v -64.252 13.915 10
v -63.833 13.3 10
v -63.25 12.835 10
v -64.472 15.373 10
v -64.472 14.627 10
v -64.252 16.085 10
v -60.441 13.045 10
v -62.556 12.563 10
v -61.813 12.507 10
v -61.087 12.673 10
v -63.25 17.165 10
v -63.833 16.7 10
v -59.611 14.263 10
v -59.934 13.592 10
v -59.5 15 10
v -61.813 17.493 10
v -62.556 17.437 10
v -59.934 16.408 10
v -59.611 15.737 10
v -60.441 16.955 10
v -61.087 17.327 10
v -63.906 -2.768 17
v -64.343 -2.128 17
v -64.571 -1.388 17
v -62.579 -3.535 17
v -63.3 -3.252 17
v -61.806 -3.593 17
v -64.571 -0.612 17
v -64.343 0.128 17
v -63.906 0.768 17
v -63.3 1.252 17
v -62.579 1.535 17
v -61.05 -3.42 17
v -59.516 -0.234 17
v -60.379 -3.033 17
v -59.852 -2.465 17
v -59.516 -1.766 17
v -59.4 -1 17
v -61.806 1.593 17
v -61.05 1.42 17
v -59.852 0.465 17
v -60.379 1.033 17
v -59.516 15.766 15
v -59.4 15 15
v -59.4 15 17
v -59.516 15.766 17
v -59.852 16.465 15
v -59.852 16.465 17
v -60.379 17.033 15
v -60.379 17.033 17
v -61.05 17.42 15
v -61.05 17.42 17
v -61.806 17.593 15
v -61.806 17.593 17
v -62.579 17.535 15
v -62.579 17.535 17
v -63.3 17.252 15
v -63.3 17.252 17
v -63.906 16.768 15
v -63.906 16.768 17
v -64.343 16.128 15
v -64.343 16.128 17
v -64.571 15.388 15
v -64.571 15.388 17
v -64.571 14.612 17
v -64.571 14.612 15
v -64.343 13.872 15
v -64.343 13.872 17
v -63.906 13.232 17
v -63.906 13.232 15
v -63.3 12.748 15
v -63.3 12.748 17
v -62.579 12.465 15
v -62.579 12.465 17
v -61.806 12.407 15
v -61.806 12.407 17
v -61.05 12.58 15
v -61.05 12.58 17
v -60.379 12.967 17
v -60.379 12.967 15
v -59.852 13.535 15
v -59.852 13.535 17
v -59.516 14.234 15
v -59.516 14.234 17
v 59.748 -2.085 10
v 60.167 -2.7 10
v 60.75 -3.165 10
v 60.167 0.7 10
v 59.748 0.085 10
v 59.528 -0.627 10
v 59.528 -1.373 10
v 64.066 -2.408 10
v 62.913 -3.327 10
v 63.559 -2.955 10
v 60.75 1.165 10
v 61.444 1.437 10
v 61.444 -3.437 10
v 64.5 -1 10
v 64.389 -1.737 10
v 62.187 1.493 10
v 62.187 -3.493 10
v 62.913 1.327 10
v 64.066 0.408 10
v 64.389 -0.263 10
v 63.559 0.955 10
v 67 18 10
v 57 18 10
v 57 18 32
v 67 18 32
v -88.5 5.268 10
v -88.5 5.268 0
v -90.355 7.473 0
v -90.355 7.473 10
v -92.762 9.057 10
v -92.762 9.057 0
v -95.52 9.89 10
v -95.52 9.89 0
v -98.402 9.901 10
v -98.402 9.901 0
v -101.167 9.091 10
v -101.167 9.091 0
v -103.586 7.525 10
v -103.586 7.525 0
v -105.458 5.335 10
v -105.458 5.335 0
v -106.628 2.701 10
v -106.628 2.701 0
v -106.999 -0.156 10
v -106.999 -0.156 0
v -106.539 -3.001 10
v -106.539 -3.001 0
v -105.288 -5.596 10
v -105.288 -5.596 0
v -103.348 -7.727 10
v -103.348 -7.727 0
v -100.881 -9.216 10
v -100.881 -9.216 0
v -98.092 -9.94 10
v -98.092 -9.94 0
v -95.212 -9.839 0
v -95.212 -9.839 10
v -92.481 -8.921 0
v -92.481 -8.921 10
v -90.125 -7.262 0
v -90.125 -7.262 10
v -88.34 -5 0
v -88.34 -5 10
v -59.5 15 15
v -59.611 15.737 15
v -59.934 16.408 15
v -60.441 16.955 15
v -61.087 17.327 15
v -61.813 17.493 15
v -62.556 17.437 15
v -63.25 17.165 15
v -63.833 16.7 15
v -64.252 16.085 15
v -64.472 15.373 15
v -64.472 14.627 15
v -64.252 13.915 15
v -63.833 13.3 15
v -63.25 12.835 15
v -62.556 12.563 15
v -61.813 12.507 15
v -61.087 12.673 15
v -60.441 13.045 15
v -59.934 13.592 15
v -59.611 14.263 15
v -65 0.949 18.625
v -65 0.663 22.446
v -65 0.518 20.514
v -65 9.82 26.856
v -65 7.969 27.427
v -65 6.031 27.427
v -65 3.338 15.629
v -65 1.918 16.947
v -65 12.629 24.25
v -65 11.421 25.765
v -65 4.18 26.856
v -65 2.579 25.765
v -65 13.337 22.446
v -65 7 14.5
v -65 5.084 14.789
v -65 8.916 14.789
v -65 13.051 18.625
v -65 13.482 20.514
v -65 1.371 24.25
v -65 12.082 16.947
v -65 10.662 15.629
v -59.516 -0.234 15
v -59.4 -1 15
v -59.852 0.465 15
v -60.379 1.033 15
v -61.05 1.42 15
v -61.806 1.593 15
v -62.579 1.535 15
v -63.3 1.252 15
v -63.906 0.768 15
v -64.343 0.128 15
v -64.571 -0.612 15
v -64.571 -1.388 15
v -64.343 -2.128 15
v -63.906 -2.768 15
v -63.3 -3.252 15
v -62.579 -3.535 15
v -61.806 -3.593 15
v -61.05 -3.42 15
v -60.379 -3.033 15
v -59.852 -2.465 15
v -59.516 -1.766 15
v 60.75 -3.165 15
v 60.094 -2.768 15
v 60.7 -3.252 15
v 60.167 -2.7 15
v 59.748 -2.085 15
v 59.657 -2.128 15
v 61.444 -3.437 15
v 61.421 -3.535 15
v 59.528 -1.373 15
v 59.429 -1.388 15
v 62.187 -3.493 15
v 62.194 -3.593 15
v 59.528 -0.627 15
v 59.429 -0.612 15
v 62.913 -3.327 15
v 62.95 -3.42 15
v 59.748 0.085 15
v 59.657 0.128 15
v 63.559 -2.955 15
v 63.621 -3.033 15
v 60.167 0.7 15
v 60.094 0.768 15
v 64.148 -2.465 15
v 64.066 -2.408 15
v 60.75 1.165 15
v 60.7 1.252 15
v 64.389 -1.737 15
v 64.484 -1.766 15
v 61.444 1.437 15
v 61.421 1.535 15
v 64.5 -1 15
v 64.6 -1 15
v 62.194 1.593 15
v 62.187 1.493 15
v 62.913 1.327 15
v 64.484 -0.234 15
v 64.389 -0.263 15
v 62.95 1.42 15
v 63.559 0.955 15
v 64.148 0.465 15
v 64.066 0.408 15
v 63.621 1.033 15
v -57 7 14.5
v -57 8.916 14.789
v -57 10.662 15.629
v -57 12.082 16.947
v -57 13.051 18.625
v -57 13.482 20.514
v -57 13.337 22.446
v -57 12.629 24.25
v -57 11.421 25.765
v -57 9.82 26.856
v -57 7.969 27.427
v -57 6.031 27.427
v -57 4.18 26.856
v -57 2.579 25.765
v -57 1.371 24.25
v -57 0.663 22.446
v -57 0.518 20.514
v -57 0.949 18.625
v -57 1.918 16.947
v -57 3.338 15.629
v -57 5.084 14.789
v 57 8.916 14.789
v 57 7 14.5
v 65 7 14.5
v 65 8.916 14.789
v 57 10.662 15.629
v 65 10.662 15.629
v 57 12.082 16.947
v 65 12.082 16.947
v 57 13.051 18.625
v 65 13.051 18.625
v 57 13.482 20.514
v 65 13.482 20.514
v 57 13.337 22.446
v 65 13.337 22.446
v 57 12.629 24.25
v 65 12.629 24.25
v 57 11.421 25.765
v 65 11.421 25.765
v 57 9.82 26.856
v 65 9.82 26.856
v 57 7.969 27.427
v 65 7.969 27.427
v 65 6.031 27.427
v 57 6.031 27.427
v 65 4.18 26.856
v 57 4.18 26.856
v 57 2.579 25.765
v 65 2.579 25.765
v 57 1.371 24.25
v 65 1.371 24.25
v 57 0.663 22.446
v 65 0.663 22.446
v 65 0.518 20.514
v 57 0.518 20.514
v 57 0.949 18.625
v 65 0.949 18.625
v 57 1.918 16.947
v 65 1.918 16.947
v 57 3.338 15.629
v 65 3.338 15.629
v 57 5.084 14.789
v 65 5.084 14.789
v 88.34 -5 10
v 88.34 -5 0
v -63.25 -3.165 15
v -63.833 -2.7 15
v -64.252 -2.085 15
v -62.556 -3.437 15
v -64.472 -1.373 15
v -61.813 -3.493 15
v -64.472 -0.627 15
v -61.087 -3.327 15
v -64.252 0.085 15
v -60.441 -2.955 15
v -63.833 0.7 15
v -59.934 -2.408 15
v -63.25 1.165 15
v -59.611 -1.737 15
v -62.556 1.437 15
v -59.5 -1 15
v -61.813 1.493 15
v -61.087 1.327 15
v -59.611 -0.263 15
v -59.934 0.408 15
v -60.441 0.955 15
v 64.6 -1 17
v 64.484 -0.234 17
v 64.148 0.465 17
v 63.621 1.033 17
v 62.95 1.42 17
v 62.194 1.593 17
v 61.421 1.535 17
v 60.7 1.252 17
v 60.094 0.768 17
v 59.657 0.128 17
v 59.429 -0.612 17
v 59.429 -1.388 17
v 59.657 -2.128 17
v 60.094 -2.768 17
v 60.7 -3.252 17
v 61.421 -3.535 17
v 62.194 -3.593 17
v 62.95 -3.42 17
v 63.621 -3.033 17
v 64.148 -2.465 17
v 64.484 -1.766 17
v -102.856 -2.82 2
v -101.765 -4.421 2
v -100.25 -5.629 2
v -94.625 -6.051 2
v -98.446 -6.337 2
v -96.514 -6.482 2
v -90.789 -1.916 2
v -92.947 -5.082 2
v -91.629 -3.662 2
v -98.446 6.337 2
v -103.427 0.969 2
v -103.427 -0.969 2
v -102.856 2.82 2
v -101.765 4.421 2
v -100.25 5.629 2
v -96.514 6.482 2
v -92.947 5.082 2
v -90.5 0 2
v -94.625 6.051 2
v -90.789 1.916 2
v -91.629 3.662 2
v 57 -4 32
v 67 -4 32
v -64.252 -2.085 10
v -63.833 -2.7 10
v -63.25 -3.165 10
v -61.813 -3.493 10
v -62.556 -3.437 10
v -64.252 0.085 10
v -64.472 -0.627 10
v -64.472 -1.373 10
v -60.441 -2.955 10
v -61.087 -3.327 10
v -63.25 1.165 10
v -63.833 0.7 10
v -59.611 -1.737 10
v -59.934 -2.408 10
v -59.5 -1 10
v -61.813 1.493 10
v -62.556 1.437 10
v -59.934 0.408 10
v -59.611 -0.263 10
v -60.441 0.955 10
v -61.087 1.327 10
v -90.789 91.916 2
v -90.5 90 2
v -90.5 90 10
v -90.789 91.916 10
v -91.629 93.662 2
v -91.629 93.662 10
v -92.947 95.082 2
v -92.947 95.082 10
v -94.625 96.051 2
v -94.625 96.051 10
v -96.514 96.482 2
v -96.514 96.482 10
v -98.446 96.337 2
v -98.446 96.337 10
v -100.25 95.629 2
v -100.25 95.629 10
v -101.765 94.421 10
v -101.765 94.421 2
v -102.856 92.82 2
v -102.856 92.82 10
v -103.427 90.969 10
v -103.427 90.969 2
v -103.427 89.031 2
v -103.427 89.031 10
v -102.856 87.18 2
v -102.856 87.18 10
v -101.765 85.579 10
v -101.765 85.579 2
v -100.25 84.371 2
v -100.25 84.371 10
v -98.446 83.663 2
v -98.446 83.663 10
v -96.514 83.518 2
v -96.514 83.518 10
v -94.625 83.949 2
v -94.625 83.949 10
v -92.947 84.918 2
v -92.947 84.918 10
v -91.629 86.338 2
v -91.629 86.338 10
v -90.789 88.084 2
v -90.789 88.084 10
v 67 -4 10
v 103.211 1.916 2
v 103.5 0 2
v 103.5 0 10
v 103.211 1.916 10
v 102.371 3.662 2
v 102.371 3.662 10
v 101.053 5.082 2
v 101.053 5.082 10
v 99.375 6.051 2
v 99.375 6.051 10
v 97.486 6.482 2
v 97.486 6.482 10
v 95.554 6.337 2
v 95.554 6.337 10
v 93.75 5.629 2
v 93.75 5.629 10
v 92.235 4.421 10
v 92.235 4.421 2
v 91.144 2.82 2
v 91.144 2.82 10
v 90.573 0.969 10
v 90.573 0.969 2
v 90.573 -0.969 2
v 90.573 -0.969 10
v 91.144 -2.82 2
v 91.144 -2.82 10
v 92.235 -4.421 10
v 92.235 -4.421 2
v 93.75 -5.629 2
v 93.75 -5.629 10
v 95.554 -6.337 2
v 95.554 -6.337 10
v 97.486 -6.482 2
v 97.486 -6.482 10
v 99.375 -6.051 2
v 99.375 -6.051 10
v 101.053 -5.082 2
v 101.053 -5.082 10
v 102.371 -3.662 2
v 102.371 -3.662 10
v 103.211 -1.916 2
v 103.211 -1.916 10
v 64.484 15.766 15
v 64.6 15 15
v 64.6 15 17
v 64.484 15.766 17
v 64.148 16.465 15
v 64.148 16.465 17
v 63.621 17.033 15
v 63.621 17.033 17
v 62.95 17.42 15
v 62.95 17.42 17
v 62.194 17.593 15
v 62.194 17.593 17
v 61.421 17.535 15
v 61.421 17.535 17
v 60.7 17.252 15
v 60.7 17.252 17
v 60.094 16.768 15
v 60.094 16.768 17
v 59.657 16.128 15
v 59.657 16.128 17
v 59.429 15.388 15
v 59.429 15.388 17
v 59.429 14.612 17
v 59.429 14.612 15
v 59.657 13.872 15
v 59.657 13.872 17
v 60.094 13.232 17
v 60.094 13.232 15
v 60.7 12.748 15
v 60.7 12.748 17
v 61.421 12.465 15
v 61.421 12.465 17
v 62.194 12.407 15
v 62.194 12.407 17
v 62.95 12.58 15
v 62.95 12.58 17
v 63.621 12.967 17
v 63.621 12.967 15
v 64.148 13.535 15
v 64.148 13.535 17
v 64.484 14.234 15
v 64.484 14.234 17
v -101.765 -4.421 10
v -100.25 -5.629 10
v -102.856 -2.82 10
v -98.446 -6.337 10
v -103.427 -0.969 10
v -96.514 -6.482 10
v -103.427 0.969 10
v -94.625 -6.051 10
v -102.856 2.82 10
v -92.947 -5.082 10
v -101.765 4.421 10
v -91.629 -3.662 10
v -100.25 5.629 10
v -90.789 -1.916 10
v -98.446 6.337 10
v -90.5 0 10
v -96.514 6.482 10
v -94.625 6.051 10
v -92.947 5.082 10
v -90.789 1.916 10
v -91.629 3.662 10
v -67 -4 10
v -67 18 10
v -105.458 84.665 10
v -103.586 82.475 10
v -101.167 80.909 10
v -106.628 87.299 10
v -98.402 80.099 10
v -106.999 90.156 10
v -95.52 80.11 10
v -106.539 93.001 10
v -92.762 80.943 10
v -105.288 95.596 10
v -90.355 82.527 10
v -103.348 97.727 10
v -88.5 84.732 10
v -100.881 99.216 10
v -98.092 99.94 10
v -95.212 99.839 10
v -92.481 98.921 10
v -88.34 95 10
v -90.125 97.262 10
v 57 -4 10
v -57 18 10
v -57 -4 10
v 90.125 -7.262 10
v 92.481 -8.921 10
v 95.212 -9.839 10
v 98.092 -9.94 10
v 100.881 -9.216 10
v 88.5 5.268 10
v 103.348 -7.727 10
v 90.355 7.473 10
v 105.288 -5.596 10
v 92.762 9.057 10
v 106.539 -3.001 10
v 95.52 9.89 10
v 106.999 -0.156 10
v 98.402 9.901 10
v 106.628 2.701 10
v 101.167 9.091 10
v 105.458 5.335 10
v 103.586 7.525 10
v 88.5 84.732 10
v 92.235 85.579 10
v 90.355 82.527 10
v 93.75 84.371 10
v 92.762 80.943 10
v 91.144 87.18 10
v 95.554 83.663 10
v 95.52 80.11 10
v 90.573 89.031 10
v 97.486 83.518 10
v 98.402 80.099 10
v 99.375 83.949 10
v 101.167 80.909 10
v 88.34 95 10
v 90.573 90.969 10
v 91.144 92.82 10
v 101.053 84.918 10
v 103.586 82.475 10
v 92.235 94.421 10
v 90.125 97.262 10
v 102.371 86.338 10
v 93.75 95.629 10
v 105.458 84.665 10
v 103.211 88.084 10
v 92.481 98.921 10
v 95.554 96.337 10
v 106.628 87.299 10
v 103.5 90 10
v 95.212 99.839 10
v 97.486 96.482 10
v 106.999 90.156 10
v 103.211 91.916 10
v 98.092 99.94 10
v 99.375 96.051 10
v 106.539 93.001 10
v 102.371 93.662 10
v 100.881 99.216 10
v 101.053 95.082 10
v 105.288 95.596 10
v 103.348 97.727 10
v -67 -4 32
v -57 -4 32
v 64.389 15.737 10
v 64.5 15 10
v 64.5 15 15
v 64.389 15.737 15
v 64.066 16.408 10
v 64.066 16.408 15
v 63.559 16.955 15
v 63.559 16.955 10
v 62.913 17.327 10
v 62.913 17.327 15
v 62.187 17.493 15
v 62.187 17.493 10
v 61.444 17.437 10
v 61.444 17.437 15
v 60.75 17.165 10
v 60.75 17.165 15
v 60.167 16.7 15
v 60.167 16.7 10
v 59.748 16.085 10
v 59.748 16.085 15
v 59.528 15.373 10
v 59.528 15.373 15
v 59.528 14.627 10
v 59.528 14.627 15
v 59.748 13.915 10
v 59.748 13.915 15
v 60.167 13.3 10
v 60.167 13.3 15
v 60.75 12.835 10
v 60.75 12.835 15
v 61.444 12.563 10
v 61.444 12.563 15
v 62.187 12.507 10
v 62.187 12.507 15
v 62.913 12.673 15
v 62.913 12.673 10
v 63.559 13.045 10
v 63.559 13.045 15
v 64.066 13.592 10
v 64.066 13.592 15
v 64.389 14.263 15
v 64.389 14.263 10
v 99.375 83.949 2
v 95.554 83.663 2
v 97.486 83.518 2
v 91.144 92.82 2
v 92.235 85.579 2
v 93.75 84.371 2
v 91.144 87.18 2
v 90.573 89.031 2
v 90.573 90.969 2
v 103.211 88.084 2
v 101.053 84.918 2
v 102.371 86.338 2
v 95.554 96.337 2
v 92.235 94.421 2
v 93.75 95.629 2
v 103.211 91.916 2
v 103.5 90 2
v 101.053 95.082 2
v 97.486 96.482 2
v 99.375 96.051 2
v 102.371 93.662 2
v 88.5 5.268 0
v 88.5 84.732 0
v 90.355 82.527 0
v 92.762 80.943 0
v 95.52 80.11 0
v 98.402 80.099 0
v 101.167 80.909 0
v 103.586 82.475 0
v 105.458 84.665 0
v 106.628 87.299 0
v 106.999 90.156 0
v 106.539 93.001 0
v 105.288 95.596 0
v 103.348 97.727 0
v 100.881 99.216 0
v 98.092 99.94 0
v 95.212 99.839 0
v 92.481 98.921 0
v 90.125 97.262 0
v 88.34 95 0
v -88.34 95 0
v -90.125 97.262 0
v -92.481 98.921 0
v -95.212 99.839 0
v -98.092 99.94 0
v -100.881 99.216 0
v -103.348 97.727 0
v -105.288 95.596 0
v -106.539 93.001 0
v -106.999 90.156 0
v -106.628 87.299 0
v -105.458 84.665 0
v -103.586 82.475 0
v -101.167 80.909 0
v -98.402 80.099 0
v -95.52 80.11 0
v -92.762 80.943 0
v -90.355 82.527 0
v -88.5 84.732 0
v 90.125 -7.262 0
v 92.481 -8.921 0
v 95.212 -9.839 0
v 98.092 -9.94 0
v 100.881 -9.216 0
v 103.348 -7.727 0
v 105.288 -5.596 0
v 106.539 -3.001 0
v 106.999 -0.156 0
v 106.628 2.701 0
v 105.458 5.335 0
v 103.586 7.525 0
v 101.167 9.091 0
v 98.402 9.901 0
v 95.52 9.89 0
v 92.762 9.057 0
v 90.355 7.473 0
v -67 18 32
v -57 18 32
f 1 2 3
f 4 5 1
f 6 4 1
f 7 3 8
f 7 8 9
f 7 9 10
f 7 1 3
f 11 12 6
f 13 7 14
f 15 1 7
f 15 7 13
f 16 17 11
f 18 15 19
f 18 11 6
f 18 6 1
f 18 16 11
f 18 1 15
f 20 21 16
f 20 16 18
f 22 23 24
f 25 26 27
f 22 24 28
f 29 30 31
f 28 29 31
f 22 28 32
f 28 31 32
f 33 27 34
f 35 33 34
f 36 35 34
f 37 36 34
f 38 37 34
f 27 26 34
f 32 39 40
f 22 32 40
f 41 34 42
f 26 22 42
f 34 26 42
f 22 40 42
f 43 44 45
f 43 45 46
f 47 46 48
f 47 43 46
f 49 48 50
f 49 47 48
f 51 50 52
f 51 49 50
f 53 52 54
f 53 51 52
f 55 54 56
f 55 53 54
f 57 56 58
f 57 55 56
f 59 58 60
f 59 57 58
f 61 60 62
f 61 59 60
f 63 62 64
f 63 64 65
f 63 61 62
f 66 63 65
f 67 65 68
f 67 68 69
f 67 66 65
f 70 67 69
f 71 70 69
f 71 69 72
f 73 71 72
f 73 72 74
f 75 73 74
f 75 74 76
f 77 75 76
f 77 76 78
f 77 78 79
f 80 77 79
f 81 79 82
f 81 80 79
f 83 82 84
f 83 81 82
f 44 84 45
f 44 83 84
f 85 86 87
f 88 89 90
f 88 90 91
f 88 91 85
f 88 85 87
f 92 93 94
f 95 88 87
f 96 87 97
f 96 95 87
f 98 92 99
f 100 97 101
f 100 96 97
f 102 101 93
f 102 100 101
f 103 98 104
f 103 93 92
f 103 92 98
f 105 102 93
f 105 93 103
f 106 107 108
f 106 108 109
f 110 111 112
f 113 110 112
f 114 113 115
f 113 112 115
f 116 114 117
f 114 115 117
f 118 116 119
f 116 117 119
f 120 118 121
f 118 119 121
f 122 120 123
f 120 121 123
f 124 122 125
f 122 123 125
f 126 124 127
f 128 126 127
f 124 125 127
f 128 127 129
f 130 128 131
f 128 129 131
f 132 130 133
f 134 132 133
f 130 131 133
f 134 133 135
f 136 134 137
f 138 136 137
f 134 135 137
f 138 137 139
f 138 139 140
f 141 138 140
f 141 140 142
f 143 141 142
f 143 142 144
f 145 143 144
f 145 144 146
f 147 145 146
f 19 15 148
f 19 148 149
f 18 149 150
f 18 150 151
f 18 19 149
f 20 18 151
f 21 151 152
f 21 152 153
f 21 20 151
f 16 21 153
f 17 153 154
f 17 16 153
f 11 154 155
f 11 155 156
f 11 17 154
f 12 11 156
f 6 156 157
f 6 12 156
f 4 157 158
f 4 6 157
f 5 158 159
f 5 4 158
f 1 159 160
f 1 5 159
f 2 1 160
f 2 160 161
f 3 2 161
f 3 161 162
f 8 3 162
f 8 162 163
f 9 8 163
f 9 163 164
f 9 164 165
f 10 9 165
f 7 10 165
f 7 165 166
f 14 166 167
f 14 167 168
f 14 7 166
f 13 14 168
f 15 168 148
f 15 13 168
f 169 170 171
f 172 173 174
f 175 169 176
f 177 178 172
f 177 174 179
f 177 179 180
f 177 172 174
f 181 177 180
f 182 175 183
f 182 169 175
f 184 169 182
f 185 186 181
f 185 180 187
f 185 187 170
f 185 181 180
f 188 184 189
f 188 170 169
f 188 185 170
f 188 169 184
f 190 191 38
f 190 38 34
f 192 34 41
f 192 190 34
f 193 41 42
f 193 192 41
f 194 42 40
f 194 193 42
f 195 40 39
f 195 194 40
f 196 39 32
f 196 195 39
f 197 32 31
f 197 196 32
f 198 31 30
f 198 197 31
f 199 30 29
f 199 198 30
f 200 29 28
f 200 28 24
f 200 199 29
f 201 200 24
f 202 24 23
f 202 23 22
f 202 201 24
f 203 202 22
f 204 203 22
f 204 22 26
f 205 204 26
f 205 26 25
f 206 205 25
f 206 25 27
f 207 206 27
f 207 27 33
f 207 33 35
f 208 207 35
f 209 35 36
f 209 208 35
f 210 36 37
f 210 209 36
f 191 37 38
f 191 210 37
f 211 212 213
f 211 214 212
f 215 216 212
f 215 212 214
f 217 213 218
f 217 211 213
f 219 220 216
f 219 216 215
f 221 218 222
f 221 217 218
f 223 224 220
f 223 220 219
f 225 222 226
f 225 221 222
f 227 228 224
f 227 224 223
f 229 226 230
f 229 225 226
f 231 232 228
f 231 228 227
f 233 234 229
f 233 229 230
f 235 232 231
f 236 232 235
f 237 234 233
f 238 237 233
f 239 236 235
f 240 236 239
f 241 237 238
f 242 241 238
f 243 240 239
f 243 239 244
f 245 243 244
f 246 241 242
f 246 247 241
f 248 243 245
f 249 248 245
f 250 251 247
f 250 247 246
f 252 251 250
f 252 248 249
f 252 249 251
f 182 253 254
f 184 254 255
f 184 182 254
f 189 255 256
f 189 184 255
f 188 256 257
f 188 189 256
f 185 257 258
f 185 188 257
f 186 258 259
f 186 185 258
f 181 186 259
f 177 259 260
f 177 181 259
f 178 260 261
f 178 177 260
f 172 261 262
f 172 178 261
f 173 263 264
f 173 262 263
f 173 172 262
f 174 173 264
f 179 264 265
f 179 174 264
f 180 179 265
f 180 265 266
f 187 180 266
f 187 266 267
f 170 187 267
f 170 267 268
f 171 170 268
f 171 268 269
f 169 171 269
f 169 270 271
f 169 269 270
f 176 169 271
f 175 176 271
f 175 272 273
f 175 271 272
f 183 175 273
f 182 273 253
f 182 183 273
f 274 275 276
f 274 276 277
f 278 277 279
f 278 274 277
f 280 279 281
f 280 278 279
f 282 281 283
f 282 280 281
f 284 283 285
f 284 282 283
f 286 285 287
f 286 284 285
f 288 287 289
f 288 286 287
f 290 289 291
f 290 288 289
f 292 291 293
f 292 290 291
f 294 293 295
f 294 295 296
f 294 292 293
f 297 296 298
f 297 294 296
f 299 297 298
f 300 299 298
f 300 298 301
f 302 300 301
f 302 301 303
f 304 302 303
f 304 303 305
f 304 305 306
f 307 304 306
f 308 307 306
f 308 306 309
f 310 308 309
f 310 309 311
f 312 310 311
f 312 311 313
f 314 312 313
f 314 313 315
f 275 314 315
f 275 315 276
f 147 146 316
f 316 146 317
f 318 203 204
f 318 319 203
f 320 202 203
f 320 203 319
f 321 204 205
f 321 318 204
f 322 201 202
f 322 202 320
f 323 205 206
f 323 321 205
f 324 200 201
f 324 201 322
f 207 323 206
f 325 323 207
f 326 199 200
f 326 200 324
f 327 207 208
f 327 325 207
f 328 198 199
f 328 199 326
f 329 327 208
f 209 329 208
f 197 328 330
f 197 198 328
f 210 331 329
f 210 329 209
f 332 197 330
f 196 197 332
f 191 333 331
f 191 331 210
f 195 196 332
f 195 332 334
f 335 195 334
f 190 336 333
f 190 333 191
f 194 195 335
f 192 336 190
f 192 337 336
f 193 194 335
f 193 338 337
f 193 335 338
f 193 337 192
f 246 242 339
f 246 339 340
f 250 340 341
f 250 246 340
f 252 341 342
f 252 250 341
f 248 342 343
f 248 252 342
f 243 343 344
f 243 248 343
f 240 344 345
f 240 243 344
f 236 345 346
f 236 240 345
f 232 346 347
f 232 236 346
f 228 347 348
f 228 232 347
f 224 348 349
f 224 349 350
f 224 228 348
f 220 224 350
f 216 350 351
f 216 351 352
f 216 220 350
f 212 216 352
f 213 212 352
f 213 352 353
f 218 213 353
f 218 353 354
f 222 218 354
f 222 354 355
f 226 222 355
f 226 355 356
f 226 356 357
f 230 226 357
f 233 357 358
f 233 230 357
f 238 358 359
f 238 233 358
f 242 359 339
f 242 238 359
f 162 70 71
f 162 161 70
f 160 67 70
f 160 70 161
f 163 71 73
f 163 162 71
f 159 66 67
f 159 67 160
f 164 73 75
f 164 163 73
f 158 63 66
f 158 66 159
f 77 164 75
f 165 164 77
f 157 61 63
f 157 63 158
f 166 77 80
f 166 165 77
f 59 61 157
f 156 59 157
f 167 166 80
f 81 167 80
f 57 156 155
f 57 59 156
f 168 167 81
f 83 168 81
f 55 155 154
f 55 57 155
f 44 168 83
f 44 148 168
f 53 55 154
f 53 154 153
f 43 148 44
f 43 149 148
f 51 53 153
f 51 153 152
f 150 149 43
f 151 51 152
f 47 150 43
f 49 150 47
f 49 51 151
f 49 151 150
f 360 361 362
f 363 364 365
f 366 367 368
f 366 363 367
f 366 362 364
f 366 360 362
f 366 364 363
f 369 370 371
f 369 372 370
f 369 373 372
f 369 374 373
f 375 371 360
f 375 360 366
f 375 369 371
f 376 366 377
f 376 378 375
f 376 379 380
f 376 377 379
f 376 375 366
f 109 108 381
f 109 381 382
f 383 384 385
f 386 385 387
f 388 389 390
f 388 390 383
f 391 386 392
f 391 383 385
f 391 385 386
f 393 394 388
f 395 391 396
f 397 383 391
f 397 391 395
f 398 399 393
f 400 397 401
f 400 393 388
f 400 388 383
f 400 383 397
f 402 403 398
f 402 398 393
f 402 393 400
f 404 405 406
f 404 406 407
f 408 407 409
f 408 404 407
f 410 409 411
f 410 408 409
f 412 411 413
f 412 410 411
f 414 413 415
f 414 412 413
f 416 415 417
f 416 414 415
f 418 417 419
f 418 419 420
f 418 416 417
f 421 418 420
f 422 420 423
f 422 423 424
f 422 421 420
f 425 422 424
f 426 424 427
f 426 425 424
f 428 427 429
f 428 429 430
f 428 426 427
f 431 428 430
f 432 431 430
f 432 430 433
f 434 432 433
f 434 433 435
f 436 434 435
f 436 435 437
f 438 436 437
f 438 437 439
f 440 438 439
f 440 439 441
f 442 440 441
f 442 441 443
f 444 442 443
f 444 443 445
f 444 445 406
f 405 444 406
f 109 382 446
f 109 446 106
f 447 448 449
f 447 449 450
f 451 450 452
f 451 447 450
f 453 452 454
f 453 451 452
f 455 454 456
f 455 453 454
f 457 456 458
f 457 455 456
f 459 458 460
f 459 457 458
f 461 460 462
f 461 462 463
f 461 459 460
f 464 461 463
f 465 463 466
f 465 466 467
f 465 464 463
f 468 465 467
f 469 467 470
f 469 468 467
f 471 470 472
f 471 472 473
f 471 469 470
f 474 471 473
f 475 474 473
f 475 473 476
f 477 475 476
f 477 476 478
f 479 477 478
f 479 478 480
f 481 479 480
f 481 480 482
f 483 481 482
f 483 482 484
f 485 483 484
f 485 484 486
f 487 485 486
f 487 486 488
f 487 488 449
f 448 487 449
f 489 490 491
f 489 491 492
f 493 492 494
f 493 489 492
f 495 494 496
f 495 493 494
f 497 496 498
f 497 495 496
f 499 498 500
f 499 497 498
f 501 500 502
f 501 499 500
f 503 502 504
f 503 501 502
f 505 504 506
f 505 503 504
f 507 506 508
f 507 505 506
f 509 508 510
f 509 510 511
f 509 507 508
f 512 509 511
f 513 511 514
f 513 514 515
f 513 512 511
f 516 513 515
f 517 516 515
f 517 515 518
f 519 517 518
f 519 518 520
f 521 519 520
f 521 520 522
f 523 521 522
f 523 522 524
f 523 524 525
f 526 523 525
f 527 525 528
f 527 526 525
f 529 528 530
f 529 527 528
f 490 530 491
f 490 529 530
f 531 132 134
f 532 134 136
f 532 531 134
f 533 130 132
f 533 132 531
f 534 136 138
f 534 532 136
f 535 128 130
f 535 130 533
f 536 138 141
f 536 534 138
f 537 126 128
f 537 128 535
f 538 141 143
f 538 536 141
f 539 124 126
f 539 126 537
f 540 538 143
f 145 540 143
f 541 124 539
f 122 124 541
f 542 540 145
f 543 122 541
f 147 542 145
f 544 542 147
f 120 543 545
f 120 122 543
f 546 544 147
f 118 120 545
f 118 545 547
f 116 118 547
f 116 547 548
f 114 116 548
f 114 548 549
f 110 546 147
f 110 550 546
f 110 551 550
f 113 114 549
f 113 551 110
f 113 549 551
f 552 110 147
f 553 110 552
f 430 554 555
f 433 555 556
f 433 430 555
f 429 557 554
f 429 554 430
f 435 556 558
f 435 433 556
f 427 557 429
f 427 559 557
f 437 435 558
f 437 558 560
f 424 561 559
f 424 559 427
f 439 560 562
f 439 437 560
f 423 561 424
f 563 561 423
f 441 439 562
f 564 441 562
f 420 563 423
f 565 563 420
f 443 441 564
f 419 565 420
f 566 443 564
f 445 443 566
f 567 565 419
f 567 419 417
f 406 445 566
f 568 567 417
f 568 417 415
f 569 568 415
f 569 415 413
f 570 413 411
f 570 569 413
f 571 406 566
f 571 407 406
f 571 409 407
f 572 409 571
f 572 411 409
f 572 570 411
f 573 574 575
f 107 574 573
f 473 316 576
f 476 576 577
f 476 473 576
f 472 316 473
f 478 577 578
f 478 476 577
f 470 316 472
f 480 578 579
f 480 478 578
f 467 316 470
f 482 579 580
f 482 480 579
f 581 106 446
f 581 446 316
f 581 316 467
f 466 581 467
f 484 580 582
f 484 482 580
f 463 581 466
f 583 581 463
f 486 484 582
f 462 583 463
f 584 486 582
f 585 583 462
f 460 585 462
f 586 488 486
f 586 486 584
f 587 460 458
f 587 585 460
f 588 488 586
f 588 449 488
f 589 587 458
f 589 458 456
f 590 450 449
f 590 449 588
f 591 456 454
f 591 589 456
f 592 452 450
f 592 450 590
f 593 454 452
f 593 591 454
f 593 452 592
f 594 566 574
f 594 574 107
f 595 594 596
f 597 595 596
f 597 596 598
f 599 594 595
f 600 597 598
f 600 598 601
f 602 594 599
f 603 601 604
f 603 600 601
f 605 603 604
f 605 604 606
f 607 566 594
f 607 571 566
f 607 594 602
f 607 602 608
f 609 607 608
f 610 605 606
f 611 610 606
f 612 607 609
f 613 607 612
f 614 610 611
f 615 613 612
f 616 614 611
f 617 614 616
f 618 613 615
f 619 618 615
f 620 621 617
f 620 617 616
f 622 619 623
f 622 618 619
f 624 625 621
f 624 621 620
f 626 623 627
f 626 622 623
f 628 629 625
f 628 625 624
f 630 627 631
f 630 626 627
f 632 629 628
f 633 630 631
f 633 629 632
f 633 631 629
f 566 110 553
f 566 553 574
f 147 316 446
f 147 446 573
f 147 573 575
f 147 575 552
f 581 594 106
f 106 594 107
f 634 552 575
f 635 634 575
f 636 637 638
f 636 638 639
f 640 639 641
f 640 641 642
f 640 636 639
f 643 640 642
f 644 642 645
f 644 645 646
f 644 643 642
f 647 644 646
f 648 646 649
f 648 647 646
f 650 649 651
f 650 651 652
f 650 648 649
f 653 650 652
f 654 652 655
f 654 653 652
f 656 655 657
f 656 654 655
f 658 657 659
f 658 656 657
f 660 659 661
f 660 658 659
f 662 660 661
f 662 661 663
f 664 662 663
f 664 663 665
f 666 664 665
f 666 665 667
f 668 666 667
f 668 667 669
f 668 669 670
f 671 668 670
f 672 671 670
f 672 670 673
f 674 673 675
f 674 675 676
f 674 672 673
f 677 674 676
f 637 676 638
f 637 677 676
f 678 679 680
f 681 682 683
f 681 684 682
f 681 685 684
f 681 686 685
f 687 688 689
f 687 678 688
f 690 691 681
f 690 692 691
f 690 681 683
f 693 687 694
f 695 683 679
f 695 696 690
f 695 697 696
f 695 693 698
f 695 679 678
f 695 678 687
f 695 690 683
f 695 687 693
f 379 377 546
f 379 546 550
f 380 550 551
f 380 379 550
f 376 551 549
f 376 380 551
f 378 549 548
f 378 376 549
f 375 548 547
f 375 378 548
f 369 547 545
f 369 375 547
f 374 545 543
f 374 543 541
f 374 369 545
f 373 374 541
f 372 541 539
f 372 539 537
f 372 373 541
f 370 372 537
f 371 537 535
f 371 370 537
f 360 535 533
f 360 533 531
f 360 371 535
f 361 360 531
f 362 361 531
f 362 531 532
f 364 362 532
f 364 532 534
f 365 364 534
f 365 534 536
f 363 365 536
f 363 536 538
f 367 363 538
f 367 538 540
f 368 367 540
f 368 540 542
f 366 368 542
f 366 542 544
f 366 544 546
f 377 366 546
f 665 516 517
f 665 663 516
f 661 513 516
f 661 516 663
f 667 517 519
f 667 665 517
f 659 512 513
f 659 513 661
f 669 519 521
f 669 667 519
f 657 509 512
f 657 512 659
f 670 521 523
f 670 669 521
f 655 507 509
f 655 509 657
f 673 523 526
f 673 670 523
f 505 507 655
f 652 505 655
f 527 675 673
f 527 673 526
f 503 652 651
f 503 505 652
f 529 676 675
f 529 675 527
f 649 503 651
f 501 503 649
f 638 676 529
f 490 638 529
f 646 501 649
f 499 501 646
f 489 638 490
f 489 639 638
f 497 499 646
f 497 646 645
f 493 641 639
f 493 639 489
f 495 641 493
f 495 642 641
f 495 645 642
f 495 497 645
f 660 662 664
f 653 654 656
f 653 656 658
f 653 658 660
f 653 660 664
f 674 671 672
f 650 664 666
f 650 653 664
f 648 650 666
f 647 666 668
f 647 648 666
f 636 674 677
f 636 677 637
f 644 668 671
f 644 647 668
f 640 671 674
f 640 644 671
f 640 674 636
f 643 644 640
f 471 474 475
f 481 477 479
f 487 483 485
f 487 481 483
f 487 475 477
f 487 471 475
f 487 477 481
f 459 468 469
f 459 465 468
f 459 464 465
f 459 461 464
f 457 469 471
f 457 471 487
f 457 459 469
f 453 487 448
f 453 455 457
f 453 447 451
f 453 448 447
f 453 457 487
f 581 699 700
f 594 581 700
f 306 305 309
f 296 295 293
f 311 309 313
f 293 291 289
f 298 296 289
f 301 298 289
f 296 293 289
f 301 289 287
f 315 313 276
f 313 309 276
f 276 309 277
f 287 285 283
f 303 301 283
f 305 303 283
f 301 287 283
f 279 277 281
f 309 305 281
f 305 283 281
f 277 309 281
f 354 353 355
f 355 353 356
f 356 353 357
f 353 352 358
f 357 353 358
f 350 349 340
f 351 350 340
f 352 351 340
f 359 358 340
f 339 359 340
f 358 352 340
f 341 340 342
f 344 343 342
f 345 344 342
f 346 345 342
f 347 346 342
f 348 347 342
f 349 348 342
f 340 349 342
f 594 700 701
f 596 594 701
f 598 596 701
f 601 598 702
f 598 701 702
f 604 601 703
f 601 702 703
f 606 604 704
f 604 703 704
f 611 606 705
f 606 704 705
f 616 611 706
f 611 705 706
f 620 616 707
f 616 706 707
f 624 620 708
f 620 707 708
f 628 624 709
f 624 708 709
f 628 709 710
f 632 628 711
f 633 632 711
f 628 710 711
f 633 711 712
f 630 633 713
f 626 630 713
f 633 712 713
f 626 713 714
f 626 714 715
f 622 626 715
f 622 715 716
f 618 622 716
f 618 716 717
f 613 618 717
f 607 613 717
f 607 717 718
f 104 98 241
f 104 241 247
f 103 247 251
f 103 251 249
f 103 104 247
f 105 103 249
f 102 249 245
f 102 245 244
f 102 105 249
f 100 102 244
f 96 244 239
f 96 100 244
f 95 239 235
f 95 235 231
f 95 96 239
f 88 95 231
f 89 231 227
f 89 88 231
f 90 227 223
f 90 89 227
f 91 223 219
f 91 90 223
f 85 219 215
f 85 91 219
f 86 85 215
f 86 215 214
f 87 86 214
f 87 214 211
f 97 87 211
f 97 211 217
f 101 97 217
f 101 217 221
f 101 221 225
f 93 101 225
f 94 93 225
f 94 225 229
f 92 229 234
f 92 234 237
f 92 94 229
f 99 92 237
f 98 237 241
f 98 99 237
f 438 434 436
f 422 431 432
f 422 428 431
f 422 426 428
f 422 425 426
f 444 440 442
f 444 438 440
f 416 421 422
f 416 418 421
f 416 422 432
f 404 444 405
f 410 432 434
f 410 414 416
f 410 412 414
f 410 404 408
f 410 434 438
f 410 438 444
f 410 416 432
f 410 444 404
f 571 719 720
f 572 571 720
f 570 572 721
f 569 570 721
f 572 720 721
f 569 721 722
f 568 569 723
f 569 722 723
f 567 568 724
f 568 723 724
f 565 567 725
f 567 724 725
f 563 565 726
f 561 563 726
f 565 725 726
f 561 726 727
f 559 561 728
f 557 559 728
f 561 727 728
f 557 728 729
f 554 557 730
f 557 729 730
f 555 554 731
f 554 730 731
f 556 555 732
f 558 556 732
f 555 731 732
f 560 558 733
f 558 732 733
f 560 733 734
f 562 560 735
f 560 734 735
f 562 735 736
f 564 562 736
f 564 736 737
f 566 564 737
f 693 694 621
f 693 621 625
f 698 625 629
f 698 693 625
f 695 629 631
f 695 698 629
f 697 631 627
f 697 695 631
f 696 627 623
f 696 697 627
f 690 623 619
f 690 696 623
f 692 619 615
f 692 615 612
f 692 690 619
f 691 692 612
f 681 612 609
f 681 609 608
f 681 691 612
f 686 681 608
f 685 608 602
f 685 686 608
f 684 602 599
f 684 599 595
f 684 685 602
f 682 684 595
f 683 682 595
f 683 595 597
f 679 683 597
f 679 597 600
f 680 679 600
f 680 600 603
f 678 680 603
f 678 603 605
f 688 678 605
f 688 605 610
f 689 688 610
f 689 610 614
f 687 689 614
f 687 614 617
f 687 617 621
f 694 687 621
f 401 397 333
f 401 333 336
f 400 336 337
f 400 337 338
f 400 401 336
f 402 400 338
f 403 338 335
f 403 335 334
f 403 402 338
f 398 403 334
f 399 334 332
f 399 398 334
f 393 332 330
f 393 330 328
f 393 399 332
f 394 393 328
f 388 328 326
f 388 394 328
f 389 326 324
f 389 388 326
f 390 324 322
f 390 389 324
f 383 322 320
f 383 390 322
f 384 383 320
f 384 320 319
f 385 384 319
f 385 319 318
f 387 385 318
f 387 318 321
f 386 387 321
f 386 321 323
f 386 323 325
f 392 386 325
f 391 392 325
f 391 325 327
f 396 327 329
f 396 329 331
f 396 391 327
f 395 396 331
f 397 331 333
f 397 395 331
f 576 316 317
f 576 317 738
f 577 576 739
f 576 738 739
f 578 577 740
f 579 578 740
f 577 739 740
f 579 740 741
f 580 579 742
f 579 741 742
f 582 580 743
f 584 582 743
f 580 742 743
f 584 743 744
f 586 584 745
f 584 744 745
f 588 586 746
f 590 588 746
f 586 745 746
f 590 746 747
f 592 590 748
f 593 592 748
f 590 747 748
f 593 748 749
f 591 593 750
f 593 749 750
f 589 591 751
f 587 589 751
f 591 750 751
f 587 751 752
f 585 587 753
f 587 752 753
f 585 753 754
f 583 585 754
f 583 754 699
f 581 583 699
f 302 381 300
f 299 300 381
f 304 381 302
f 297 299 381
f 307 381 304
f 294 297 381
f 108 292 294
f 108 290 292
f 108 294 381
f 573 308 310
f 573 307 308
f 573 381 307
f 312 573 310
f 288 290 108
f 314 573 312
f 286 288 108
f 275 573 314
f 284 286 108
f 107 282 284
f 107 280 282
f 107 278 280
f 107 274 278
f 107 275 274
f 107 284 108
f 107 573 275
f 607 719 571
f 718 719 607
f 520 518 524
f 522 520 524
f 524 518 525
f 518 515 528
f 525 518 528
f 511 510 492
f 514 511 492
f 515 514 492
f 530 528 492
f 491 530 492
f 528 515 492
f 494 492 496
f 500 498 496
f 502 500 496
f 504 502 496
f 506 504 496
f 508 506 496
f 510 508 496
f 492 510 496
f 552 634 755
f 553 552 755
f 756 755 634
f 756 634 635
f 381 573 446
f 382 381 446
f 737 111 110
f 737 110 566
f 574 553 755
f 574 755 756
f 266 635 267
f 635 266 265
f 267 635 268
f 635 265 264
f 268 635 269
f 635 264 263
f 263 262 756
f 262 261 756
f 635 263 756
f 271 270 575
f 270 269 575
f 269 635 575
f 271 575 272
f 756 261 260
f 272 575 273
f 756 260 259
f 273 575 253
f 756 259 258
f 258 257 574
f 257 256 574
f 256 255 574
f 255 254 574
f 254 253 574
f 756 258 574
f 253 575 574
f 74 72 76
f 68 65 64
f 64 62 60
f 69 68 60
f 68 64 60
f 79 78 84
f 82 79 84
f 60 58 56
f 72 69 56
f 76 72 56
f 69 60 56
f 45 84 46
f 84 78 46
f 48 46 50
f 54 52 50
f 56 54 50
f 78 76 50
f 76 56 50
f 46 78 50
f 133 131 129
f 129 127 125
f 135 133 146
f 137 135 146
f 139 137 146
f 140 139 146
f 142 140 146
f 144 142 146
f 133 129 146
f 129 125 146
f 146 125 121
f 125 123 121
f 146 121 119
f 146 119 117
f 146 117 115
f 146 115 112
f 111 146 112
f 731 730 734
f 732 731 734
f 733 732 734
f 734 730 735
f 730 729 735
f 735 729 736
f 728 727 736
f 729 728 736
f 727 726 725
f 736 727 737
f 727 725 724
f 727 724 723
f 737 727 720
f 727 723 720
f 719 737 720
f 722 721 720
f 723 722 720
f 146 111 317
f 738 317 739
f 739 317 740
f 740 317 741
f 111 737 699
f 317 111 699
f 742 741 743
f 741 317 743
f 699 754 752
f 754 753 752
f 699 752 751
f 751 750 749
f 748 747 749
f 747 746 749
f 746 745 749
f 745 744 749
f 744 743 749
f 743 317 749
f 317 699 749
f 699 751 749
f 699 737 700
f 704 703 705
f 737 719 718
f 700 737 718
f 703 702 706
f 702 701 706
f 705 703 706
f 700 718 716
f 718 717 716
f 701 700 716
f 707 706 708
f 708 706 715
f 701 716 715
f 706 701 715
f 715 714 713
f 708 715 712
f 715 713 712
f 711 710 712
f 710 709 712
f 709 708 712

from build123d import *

# Parameters (mm, degrees)
CYLINDER093_R     = 10
CYLINDER093_DEPTH = 2
CYLINDER091_R     = 10
CYLINDER091_DEPTH = 2
CYLINDER090_R     = 10
CYLINDER090_DEPTH = 2
CYLINDER087_R     = 6.5
CYLINDER087_DEPTH = 10
CYLINDER086_R     = 10
CYLINDER086_DEPTH = 10
CYLINDER088_R     = 6.5
CYLINDER088_DEPTH = 10
CYLINDER089_R     = 10
CYLINDER089_DEPTH = 10
CYLINDER084_R     = 6.5
CYLINDER084_DEPTH = 10
CYLINDER082_R     = 10
CYLINDER082_DEPTH = 10
CYLINDER083_R     = 6.5
CYLINDER083_DEPTH = 10
CYLINDER085_R     = 10
CYLINDER085_DEPTH = 10
BOX025_W          = 177
BOX025_H          = 100
BOX025_DEPTH      = 10
CYLINDER069_R     = 2.6
CYLINDER069_DEPTH = 2
CYLINDER068_R     = 2.5
CYLINDER068_DEPTH = 5
CYLINDER071_R     = 2.6
CYLINDER071_DEPTH = 2
CYLINDER070_R     = 2.5
CYLINDER070_DEPTH = 5
CYLINDER073_R     = 2.6
CYLINDER073_DEPTH = 2
CYLINDER072_R     = 2.5
CYLINDER072_DEPTH = 5
CYLINDER066_R     = 2.6
CYLINDER066_DEPTH = 2
CYLINDER067_R     = 2.5
CYLINDER067_DEPTH = 5
CYLINDER063_R     = 6.5
CYLINDER063_DEPTH = 130
BOX024_W          = 10
BOX024_H          = 22
BOX024_DEPTH      = 22
BOX023_W          = 10
BOX023_H          = 22
BOX023_DEPTH      = 22
CYLINDER092_R     = 10
CYLINDER092_DEPTH = 2


with BuildPart() as cilindro093:
    # Cylinder093 → Cylinder093 (new body)
    with BuildSketch(Plane(origin=(97, 0, 0), x_dir=(1, 0, 0), z_dir=(0, 0, 1))):
        Circle(CYLINDER093_R)
    extrude(amount=CYLINDER093_DEPTH)


with BuildPart() as cilindro091:
    # Cylinder091 → Cylinder091 (new body)
    with BuildSketch(Plane(origin=(-97, 90, 0), x_dir=(1, 0, 0), z_dir=(0, 0, 1))):
        Circle(CYLINDER091_R)
    extrude(amount=CYLINDER091_DEPTH)


with BuildPart() as cilindro090:
    # Cylinder090 → Cylinder090 (new body)
    with BuildSketch(Plane(origin=(-97, 0, 0), x_dir=(1, 0, 0), z_dir=(0, 0, 1))):
        Circle(CYLINDER090_R)
    extrude(amount=CYLINDER090_DEPTH)


with BuildPart() as cilindro087:
    # Cylinder087 → Cylinder087 (new body)
    with BuildSketch(Plane(origin=(0, 20, 0), x_dir=(1, 0, 0), z_dir=(0, 0, 1))):
        Circle(CYLINDER087_R)
    extrude(amount=CYLINDER087_DEPTH)


with BuildPart() as unionbarra020:
    # Cylinder086 → Cylinder086 (new body)
    with BuildSketch(Plane(origin=(0, 20, 0), x_dir=(1, 0, 0), z_dir=(0, 0, 1))):
        Circle(CYLINDER086_R)
    extrude(amount=CYLINDER086_DEPTH)

    # Cut051: cut Cilindro087
    add(cilindro087.part, mode=Mode.SUBTRACT)


with BuildPart() as unionbarra020_1:
    # Cut051 placement: moved
    add(unionbarra020.part.moved(Location((-97, -20, 0))))


with BuildPart() as cilindro088:
    # Cylinder088 → Cylinder088 (new body)
    with BuildSketch(Plane(origin=(0, 20, 0), x_dir=(1, 0, 0), z_dir=(0, 0, 1))):
        Circle(CYLINDER088_R)
    extrude(amount=CYLINDER088_DEPTH)


with BuildPart() as fusion034:
    # Cylinder089 → Cylinder089 (new body)
    with BuildSketch(Plane(origin=(0, 20, 0), x_dir=(1, 0, 0), z_dir=(0, 0, 1))):
        Circle(CYLINDER089_R)
    extrude(amount=CYLINDER089_DEPTH)

    # Cut052: cut Cilindro088
    add(cilindro088.part, mode=Mode.SUBTRACT)


with BuildPart() as fusion034_1:
    # Cut052 placement: moved
    add(fusion034.part.moved(Location((97, -20, 0))))

    # Fusion034: union unionbarra020
    add(unionbarra020_1.part)


with BuildPart() as fusion034_2:
    # Fusion034 placement: moved
    add(fusion034_1.part.moved(Location((0, 90, 0))))


with BuildPart() as cilindro084:
    # Cylinder084 → Cylinder084 (new body)
    with BuildSketch(Plane(origin=(0, 20, 0), x_dir=(1, 0, 0), z_dir=(0, 0, 1))):
        Circle(CYLINDER084_R)
    extrude(amount=CYLINDER084_DEPTH)


with BuildPart() as unionbarra018:
    # Cylinder082 → Cylinder082 (new body)
    with BuildSketch(Plane(origin=(0, 20, 0), x_dir=(1, 0, 0), z_dir=(0, 0, 1))):
        Circle(CYLINDER082_R)
    extrude(amount=CYLINDER082_DEPTH)

    # Cut049: cut Cilindro084
    add(cilindro084.part, mode=Mode.SUBTRACT)


with BuildPart() as unionbarra018_1:
    # Cut049 placement: moved
    add(unionbarra018.part.moved(Location((-97, -20, 0))))


with BuildPart() as cilindro083:
    # Cylinder083 → Cylinder083 (new body)
    with BuildSketch(Plane(origin=(0, 20, 0), x_dir=(1, 0, 0), z_dir=(0, 0, 1))):
        Circle(CYLINDER083_R)
    extrude(amount=CYLINDER083_DEPTH)


with BuildPart() as fusion033:
    # Cylinder085 → Cylinder085 (new body)
    with BuildSketch(Plane(origin=(0, 20, 0), x_dir=(1, 0, 0), z_dir=(0, 0, 1))):
        Circle(CYLINDER085_R)
    extrude(amount=CYLINDER085_DEPTH)

    # Cut050: cut Cilindro083
    add(cilindro083.part, mode=Mode.SUBTRACT)


with BuildPart() as fusion033_1:
    # Cut050 placement: moved
    add(fusion033.part.moved(Location((97, -20, 0))))

    # Fusion033: union unionbarra018
    add(unionbarra018_1.part)


with BuildPart() as barra007:
    # Box025 → Box025 (new body)
    with BuildSketch(Plane(origin=(-88.5, -5, 0), x_dir=(1, 0, 0), z_dir=(0, 0, 1))):
        with Locations((88.5, 50)):
            Rectangle(BOX025_W, BOX025_H)
    extrude(amount=BOX025_DEPTH)


with BuildPart() as cilindro069:
    # Cylinder069 → Cylinder069 (new body)
    with BuildSketch(Plane.XY.offset(5)):
        Circle(CYLINDER069_R)
    extrude(amount=CYLINDER069_DEPTH)


with BuildPart() as enganche_lego002:
    # Cylinder068 → Cylinder068 (new body)
    with BuildSketch(Plane.XY):
        Circle(CYLINDER068_R)
    extrude(amount=CYLINDER068_DEPTH)

    # Fusion024: union Cilindro069
    add(cilindro069.part)


with BuildPart() as enganche_lego002_1:
    # Fusion024 placement: moved
    add(enganche_lego002.part.moved(Location((3, 8, -11))))


with BuildPart() as cilindro071:
    # Cylinder071 → Cylinder071 (new body)
    with BuildSketch(Plane.XY.offset(5)):
        Circle(CYLINDER071_R)
    extrude(amount=CYLINDER071_DEPTH)


with BuildPart() as enganche_lego003:
    # Cylinder070 → Cylinder070 (new body)
    with BuildSketch(Plane.XY):
        Circle(CYLINDER070_R)
    extrude(amount=CYLINDER070_DEPTH)

    # Fusion025: union Cilindro071
    add(cilindro071.part)


with BuildPart() as enganche_lego003_1:
    # Fusion025 placement: moved
    add(enganche_lego003.part.moved(Location((127, 8, -11))))


with BuildPart() as cilindro073:
    # Cylinder073 → Cylinder073 (new body)
    with BuildSketch(Plane.XY.offset(5)):
        Circle(CYLINDER073_R)
    extrude(amount=CYLINDER073_DEPTH)


with BuildPart() as enganche_lego004:
    # Cylinder072 → Cylinder072 (new body)
    with BuildSketch(Plane.XY):
        Circle(CYLINDER072_R)
    extrude(amount=CYLINDER072_DEPTH)

    # Fusion026: union Cilindro073
    add(cilindro073.part)


with BuildPart() as enganche_lego004_1:
    # Fusion026 placement: moved
    add(enganche_lego004.part.moved(Location((127, -8, -11))))


with BuildPart() as cilindro066:
    # Cylinder066 → Cylinder066 (new body)
    with BuildSketch(Plane.XY.offset(5)):
        Circle(CYLINDER066_R)
    extrude(amount=CYLINDER066_DEPTH)


with BuildPart() as fusion027:
    # Cylinder067 → Cylinder067 (new body)
    with BuildSketch(Plane.XY):
        Circle(CYLINDER067_R)
    extrude(amount=CYLINDER067_DEPTH)

    # Fusion023: union Cilindro066
    add(cilindro066.part)


with BuildPart() as fusion027_1:
    # Fusion023 placement: moved
    add(fusion027.part.moved(Location((3, -8, -11))))

    # Fusion027: union enganche_lego002, enganche_lego003, enganche_lego004
    add(enganche_lego002_1.part)
    add(enganche_lego003_1.part)
    add(enganche_lego004_1.part)


with BuildPart() as cilindro063:
    # Cylinder063 → Cylinder063 (new body)
    with BuildSketch(Plane(origin=(0, 0, 0), x_dir=(0, 0, -1), z_dir=(1, 0, 0))):
        Circle(CYLINDER063_R)
    extrude(amount=CYLINDER063_DEPTH)


with BuildPart() as cubo022:
    # Box024 → Box024 (new body)
    with BuildSketch(Plane(origin=(122, -11, -11), x_dir=(1, 0, 0), z_dir=(0, 0, 1))):
        with Locations((5, 11)):
            Rectangle(BOX024_W, BOX024_H)
    extrude(amount=BOX024_DEPTH)


with BuildPart() as lim_barra:
    # Box023 → Box023 (new body)
    with BuildSketch(Plane(origin=(-2, -11, -11), x_dir=(1, 0, 0), z_dir=(0, 0, 1))):
        with Locations((5, 11)):
            Rectangle(BOX023_W, BOX023_H)
    extrude(amount=BOX023_DEPTH)

    # Fusion021: union Cubo022
    add(cubo022.part)

    # Cut046: cut Cilindro063
    add(cilindro063.part, mode=Mode.SUBTRACT)

    # Cut047: cut Fusion027
    add(fusion027_1.part, mode=Mode.SUBTRACT)


with BuildPart() as lim_barra_1:
    # Cut047 placement: moved
    add(lim_barra.part.moved(Location((-65, 7, 21))))


with BuildPart() as placa_fija_arriba:
    # Cylinder092 → Cylinder092 (new body)
    with BuildSketch(Plane(origin=(97, 90, 0), x_dir=(1, 0, 0), z_dir=(0, 0, 1))):
        Circle(CYLINDER092_R)
    extrude(amount=CYLINDER092_DEPTH)

    # Fusion035: union Cilindro093, Cilindro091, Cilindro090, Fusion034, Fusion033, barra007, lim_barra
    add(cilindro093.part)
    add(cilindro091.part)
    add(cilindro090.part)
    add(fusion034_2.part)
    add(fusion033_1.part)
    add(barra007.part)
    add(lim_barra_1.part)


solid = placa_fija_arriba.part
